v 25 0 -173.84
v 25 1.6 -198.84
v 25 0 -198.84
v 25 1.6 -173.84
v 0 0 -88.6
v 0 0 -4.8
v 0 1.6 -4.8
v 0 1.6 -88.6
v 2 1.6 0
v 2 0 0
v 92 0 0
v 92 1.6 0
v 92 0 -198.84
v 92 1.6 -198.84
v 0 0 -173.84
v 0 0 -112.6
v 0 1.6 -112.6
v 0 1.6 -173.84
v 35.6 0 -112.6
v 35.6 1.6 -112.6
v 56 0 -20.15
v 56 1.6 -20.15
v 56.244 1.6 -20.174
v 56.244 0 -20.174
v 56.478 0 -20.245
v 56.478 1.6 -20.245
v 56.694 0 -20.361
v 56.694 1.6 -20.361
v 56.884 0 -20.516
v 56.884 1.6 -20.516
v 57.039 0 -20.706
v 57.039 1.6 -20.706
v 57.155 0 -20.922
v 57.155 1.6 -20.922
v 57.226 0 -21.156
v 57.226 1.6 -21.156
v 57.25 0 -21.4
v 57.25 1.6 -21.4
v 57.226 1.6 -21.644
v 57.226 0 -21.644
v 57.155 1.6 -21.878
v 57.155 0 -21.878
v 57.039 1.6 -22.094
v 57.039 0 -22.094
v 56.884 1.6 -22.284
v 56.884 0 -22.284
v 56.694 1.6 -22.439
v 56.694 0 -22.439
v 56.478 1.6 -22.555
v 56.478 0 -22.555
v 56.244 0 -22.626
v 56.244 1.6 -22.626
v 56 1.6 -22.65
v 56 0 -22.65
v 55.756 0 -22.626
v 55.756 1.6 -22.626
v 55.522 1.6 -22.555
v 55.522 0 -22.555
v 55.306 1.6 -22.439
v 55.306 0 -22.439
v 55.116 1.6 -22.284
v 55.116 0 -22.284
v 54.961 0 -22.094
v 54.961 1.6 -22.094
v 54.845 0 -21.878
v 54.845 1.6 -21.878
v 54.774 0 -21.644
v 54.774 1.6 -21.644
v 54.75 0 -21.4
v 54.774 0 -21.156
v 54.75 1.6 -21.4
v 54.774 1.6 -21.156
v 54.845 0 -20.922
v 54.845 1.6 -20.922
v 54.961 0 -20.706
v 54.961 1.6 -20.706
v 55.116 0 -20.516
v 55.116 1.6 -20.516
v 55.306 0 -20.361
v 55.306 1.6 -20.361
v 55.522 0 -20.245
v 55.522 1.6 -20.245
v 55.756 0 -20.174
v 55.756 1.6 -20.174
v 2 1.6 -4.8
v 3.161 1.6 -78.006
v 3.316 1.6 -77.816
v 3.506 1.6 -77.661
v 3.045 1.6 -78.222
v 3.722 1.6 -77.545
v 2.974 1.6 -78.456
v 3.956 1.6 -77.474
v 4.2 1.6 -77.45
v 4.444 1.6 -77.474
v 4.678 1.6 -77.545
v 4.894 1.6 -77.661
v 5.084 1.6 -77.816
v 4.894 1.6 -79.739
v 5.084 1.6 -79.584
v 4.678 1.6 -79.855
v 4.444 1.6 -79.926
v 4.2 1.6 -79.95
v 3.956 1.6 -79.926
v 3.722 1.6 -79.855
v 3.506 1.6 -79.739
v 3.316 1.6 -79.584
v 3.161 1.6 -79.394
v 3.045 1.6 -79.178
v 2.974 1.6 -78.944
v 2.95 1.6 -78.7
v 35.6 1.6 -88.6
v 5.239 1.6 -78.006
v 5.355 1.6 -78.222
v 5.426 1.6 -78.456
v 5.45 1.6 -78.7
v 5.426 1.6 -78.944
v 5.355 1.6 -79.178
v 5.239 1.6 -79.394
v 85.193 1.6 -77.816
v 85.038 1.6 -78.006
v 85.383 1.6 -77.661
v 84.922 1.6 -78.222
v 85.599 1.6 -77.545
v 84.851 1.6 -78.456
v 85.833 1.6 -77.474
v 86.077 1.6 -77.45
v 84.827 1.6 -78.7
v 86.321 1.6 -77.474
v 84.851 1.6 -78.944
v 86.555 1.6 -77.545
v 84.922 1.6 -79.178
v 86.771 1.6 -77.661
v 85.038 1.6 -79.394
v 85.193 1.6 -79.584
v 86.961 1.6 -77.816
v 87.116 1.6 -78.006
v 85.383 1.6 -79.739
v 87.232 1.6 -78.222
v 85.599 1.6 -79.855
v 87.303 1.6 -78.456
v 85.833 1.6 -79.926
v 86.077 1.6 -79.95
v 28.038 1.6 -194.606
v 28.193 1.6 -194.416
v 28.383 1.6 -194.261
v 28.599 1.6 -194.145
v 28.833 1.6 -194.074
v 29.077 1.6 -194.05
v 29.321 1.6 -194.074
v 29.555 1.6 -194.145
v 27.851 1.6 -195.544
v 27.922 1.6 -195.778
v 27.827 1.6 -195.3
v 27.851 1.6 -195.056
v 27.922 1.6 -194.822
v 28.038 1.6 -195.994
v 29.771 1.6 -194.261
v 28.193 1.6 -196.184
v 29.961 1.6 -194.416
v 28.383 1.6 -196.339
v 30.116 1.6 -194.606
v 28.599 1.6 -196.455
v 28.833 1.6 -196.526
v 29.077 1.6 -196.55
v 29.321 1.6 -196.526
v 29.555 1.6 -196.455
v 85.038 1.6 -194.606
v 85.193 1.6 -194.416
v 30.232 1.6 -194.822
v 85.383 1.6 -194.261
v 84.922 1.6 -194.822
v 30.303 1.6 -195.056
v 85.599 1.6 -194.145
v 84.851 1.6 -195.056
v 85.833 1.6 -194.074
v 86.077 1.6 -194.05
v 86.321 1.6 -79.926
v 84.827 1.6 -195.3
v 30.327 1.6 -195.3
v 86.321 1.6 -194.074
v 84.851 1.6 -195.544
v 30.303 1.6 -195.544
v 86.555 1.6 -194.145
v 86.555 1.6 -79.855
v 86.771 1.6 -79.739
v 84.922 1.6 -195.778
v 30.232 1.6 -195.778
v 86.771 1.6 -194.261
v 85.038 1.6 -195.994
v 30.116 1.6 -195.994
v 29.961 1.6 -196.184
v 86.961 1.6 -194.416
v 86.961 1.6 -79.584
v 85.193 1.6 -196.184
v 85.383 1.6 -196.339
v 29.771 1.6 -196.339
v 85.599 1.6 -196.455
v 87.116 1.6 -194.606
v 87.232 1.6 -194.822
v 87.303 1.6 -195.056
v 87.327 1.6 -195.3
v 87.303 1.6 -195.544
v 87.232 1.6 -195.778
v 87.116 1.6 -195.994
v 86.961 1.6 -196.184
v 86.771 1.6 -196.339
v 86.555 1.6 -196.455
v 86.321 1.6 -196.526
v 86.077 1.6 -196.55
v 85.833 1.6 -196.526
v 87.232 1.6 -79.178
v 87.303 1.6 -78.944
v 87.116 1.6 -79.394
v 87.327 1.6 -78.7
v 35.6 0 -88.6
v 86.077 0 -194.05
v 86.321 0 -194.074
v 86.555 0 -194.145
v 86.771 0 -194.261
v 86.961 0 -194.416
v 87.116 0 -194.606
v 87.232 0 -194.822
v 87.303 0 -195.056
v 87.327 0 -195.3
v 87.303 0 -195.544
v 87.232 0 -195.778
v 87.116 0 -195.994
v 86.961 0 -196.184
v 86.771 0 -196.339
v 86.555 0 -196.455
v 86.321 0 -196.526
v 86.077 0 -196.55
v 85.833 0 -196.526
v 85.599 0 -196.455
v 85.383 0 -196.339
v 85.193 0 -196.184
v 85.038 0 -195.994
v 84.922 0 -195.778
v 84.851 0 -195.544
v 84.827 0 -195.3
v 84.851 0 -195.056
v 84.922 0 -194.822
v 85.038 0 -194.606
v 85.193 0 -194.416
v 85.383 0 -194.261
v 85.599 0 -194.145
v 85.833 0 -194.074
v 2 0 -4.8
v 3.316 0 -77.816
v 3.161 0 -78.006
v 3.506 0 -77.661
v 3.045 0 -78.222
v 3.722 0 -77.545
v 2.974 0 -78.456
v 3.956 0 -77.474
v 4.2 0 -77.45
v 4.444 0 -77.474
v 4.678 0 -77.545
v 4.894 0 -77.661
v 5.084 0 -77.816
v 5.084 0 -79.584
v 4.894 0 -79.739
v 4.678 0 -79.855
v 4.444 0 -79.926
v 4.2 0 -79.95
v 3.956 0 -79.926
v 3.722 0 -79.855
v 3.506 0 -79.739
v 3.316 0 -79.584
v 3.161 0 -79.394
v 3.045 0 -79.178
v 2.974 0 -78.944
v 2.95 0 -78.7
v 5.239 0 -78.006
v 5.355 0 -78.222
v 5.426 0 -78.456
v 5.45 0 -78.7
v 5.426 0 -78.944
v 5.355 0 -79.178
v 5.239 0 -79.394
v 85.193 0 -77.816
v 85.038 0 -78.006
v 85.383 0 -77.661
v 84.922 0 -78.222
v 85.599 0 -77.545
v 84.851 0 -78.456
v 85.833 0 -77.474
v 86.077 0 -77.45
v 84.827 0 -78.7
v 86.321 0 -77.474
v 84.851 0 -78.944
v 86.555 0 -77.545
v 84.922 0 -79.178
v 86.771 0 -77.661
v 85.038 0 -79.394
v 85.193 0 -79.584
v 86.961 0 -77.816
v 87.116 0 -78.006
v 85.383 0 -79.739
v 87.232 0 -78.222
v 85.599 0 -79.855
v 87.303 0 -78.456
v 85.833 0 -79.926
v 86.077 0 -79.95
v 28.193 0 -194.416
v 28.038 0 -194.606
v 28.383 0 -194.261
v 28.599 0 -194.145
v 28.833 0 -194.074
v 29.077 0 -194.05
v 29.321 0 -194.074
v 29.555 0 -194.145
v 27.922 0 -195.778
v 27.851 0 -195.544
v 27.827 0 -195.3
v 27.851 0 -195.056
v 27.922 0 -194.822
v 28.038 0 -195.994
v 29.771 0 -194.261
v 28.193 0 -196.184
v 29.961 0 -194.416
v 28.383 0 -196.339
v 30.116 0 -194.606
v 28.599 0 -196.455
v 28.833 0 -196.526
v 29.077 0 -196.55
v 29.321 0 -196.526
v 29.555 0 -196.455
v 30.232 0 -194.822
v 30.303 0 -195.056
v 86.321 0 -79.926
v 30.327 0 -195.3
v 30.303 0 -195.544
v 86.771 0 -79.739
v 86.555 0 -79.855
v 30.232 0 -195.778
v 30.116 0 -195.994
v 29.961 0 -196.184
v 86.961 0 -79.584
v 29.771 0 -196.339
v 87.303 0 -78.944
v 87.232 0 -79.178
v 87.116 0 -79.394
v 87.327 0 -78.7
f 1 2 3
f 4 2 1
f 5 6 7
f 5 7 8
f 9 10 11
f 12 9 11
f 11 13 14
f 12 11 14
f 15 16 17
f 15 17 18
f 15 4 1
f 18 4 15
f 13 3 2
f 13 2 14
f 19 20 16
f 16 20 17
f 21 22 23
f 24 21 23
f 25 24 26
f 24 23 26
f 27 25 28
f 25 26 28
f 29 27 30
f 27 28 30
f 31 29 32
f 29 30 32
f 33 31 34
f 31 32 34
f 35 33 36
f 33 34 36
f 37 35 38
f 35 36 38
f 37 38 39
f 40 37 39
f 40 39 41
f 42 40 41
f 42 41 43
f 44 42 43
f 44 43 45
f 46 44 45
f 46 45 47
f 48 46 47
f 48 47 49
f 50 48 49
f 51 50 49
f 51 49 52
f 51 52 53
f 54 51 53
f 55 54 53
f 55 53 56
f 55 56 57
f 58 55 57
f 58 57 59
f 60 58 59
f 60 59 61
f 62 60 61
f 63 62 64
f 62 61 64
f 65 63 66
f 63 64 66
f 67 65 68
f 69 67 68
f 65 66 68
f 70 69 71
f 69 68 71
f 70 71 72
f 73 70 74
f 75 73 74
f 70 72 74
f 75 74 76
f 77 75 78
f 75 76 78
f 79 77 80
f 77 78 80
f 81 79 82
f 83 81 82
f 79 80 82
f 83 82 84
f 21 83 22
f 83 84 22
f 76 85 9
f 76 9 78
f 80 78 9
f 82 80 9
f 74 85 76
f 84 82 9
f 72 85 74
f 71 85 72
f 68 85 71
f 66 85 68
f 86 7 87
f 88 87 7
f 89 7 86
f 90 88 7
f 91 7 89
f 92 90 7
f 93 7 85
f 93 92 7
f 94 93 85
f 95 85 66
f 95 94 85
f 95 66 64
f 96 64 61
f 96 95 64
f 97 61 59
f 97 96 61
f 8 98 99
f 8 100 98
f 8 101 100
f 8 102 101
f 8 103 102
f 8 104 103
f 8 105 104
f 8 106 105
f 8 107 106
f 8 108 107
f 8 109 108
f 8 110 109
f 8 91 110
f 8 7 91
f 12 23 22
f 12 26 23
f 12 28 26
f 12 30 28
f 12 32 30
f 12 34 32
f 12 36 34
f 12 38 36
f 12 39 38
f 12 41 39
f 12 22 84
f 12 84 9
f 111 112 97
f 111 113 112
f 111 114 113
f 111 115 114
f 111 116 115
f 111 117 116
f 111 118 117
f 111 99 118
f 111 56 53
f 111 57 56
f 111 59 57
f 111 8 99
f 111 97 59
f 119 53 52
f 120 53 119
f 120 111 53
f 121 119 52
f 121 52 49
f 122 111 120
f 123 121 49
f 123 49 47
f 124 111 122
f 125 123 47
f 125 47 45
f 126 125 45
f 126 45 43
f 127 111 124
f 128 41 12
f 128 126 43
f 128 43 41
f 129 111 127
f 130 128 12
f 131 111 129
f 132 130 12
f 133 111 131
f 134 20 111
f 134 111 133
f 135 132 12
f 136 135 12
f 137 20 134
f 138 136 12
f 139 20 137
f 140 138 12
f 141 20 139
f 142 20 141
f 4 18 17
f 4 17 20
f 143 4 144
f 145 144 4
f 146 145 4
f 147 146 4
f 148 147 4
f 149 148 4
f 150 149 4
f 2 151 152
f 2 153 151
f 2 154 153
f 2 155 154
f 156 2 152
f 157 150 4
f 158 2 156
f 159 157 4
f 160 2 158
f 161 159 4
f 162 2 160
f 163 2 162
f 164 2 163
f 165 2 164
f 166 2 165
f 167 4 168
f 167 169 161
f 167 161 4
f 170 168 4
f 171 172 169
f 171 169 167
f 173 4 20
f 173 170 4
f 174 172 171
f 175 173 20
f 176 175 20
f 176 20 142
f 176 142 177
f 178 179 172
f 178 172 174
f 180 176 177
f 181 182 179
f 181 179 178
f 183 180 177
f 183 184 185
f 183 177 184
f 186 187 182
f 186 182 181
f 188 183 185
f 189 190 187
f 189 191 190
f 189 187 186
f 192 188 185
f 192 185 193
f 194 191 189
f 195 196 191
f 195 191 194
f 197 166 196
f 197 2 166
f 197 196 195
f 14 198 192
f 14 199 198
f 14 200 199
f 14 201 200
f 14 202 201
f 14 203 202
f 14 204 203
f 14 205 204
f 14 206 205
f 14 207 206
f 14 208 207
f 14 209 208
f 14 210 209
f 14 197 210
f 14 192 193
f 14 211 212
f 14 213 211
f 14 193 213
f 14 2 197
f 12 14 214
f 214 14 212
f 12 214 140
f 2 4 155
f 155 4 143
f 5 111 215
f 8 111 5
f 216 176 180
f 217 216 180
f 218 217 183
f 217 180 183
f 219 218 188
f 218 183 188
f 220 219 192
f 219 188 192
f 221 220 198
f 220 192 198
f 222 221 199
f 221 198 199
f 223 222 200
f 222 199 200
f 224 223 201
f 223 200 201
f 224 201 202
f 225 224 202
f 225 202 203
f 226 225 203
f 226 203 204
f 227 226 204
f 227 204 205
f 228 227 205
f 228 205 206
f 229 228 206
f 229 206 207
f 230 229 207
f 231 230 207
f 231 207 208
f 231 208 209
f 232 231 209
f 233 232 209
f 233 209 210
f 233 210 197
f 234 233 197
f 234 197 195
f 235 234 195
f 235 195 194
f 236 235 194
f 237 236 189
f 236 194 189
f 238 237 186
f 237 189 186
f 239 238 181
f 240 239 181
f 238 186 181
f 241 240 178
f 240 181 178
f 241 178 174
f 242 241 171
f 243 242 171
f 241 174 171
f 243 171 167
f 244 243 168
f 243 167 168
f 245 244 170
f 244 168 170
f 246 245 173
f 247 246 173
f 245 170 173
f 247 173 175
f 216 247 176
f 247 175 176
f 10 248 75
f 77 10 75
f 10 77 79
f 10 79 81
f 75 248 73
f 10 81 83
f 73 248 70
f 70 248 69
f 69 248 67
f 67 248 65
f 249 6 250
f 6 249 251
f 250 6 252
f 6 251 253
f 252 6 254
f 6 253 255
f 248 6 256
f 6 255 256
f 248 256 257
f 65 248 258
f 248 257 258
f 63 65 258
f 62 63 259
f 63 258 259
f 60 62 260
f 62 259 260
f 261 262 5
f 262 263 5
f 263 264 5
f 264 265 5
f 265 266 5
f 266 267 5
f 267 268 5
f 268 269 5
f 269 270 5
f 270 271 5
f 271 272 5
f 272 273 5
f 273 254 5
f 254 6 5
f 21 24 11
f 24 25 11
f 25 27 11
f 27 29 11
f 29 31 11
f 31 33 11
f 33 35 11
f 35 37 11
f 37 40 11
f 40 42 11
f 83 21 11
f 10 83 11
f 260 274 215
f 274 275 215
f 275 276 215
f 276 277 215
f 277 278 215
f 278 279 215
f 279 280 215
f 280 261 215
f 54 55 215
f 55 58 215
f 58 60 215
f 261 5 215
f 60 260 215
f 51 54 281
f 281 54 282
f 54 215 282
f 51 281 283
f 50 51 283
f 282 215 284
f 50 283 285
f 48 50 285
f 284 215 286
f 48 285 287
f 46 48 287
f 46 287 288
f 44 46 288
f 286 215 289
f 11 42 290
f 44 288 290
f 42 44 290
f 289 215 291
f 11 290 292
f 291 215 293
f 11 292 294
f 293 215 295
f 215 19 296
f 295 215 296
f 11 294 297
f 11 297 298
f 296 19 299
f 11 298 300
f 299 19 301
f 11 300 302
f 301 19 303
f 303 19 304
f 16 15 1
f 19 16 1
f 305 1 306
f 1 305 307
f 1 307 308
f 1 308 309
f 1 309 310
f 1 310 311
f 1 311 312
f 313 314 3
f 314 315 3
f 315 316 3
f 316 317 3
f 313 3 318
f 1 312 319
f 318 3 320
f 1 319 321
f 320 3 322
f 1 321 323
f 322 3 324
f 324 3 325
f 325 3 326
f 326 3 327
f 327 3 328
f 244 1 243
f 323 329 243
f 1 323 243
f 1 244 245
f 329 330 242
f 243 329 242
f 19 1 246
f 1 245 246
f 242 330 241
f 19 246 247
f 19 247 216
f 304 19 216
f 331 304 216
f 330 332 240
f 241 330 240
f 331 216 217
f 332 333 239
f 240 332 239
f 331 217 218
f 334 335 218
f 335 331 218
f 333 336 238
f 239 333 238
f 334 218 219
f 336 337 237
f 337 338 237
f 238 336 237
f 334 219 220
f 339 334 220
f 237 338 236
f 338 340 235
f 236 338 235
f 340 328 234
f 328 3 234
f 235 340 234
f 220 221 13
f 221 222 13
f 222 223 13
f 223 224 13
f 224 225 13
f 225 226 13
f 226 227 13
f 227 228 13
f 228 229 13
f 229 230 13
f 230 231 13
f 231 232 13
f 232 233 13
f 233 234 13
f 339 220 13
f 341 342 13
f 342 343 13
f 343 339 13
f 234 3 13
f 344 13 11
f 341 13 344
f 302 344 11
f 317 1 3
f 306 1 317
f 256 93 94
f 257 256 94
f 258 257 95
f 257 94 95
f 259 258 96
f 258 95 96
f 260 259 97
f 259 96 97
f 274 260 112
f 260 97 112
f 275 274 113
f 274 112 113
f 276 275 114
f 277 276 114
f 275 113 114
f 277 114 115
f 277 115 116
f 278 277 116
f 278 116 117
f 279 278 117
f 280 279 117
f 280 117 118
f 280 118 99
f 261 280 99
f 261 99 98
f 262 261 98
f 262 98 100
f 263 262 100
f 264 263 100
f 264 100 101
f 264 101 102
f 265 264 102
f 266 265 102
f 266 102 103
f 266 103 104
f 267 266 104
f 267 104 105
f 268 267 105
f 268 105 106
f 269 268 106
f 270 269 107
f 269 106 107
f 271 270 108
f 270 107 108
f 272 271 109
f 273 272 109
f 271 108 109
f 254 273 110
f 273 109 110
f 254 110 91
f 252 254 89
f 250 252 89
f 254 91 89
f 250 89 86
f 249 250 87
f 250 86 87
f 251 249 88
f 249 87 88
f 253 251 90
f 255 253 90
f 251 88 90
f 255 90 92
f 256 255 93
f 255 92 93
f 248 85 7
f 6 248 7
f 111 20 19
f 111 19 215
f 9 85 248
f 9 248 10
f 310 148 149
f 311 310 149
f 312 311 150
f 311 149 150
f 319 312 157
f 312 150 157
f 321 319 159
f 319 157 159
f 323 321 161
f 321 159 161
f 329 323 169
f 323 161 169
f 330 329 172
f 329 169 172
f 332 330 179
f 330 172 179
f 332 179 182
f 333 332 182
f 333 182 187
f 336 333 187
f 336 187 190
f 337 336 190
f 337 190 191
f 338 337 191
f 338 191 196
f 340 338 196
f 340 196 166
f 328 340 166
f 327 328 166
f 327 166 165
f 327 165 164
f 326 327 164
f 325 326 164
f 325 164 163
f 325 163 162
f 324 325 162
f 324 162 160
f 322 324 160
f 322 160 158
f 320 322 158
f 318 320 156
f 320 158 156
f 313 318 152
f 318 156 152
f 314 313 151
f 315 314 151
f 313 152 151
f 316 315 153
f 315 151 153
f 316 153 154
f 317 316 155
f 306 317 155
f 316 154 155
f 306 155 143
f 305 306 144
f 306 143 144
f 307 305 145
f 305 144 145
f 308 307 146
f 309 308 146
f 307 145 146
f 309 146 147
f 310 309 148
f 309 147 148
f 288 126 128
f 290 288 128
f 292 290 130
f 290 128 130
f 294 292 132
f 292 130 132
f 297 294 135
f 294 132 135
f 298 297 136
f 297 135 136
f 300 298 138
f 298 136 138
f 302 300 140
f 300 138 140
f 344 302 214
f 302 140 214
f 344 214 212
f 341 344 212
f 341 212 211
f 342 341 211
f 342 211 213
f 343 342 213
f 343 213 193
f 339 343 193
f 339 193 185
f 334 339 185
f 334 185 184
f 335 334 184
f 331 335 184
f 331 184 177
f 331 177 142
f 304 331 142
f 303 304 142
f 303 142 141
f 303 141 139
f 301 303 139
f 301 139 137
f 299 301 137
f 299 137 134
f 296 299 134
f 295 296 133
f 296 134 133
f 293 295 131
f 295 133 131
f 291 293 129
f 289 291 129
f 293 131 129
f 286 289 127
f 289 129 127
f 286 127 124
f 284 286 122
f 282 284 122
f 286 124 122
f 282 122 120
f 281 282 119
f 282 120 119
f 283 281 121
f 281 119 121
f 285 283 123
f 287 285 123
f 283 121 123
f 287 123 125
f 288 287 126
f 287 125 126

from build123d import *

# Parameters (mm, degrees)
SKETCH2_W          = 93
SKETCH2_H          = 198.84
EXTRUDE1_DEPTH     = 1.6
SKETCH3_W          = 2
SKETCH3_H          = 4.8
CUT_EXTRUDE1_DEPTH = 220.519715743
SKETCH4_W          = 35.6
SKETCH4_H          = 24
CUT_EXTRUDE2_DEPTH = 220.519715743
SKETCH6_W          = 25
SKETCH6_H          = 25
CUT_EXTRUDE3_DEPTH = 220.519715743
SKETCH7_R          = 1.25
CUT_EXTRUDE4_DEPTH = 220.519715743
SKETCH8_R          = 1.25
CUT_EXTRUDE5_DEPTH = 220.519715743
SKETCH10_W         = 1
SKETCH10_H         = 1.6
CUT_EXTRUDE6_DEPTH = 220.519715743


with BuildPart() as part:
    # Sketch2 → Extrude1 (new body)
    with BuildSketch(Plane(origin=(0, 0, 0), x_dir=(1, 0, 0), z_dir=(0, 1, 0))):
        with Locations((46.5, 99.42)):
            Rectangle(SKETCH2_W, SKETCH2_H)
    extrude(amount=EXTRUDE1_DEPTH)

    # Sketch3 → Cut-Extrude1 (cut, through all)
    with BuildSketch(Plane(origin=(0, 1.6, 0), x_dir=(-1, 0, 0), z_dir=(0, 1, 0))):
        with Locations((-1, -2.4)):
            Rectangle(SKETCH3_W, SKETCH3_H)
    extrude(amount=-CUT_EXTRUDE1_DEPTH, mode=Mode.SUBTRACT)

    # Sketch4 → Cut-Extrude2 (cut, through all)
    with BuildSketch(Plane(origin=(0, 1.6, 0), x_dir=(-1, 0, 0), z_dir=(0, 1, 0))):
        with Locations((-17.8, -100.6)):
            Rectangle(SKETCH4_W, SKETCH4_H)
    extrude(amount=-CUT_EXTRUDE2_DEPTH, mode=Mode.SUBTRACT)

    # Sketch6 → Cut-Extrude3 (cut, through all)
    with BuildSketch(Plane(origin=(0, 1.6, 0), x_dir=(-1, 0, 0), z_dir=(0, 1, 0))):
        with Locations((-12.5, -186.34)):
            Rectangle(SKETCH6_W, SKETCH6_H)
    extrude(amount=-CUT_EXTRUDE3_DEPTH, mode=Mode.SUBTRACT)

    # Sketch7 → Cut-Extrude4 (cut, through all)
    with BuildSketch(Plane(origin=(0, 1.6, 0), x_dir=(-1, 0, 0), z_dir=(0, 1, 0))):
        with Locations(Location((-29.077, -195.3, 0), (0, 0, 90))):
            Circle(SKETCH7_R)
        with Locations(Location((-86.077, -195.3, 0), (0, 0, 90))):
            Circle(SKETCH7_R)
        with Locations(Location((-4.2, -78.7, 0), (0, 0, 90))):
            Circle(SKETCH7_R)
        with Locations(Location((-86.077, -78.7, 0), (0, 0, 90))):
            Circle(SKETCH7_R)
    extrude(amount=-CUT_EXTRUDE4_DEPTH, mode=Mode.SUBTRACT)

    # Sketch8 → Cut-Extrude5 (cut, through all)
    with BuildSketch(Plane(origin=(0, 1.6, 0), x_dir=(-1, 0, 0), z_dir=(0, 1, 0))):
        with Locations(Location((-56, -21.4, 0), (0, 0, 90))):
            Circle(SKETCH8_R)
    extrude(amount=-CUT_EXTRUDE5_DEPTH, mode=Mode.SUBTRACT)

    # Sketch10 → Cut-Extrude6 (cut, through all)
    with BuildSketch(Plane(origin=(0, 0, -198.84), x_dir=(-1, 0, 0), z_dir=(0, 0, -1))):
        with Locations((-92.5, 0.8)):
            Rectangle(SKETCH10_W, SKETCH10_H)
    extrude(amount=-CUT_EXTRUDE6_DEPTH, mode=Mode.SUBTRACT)


solid = part.part
